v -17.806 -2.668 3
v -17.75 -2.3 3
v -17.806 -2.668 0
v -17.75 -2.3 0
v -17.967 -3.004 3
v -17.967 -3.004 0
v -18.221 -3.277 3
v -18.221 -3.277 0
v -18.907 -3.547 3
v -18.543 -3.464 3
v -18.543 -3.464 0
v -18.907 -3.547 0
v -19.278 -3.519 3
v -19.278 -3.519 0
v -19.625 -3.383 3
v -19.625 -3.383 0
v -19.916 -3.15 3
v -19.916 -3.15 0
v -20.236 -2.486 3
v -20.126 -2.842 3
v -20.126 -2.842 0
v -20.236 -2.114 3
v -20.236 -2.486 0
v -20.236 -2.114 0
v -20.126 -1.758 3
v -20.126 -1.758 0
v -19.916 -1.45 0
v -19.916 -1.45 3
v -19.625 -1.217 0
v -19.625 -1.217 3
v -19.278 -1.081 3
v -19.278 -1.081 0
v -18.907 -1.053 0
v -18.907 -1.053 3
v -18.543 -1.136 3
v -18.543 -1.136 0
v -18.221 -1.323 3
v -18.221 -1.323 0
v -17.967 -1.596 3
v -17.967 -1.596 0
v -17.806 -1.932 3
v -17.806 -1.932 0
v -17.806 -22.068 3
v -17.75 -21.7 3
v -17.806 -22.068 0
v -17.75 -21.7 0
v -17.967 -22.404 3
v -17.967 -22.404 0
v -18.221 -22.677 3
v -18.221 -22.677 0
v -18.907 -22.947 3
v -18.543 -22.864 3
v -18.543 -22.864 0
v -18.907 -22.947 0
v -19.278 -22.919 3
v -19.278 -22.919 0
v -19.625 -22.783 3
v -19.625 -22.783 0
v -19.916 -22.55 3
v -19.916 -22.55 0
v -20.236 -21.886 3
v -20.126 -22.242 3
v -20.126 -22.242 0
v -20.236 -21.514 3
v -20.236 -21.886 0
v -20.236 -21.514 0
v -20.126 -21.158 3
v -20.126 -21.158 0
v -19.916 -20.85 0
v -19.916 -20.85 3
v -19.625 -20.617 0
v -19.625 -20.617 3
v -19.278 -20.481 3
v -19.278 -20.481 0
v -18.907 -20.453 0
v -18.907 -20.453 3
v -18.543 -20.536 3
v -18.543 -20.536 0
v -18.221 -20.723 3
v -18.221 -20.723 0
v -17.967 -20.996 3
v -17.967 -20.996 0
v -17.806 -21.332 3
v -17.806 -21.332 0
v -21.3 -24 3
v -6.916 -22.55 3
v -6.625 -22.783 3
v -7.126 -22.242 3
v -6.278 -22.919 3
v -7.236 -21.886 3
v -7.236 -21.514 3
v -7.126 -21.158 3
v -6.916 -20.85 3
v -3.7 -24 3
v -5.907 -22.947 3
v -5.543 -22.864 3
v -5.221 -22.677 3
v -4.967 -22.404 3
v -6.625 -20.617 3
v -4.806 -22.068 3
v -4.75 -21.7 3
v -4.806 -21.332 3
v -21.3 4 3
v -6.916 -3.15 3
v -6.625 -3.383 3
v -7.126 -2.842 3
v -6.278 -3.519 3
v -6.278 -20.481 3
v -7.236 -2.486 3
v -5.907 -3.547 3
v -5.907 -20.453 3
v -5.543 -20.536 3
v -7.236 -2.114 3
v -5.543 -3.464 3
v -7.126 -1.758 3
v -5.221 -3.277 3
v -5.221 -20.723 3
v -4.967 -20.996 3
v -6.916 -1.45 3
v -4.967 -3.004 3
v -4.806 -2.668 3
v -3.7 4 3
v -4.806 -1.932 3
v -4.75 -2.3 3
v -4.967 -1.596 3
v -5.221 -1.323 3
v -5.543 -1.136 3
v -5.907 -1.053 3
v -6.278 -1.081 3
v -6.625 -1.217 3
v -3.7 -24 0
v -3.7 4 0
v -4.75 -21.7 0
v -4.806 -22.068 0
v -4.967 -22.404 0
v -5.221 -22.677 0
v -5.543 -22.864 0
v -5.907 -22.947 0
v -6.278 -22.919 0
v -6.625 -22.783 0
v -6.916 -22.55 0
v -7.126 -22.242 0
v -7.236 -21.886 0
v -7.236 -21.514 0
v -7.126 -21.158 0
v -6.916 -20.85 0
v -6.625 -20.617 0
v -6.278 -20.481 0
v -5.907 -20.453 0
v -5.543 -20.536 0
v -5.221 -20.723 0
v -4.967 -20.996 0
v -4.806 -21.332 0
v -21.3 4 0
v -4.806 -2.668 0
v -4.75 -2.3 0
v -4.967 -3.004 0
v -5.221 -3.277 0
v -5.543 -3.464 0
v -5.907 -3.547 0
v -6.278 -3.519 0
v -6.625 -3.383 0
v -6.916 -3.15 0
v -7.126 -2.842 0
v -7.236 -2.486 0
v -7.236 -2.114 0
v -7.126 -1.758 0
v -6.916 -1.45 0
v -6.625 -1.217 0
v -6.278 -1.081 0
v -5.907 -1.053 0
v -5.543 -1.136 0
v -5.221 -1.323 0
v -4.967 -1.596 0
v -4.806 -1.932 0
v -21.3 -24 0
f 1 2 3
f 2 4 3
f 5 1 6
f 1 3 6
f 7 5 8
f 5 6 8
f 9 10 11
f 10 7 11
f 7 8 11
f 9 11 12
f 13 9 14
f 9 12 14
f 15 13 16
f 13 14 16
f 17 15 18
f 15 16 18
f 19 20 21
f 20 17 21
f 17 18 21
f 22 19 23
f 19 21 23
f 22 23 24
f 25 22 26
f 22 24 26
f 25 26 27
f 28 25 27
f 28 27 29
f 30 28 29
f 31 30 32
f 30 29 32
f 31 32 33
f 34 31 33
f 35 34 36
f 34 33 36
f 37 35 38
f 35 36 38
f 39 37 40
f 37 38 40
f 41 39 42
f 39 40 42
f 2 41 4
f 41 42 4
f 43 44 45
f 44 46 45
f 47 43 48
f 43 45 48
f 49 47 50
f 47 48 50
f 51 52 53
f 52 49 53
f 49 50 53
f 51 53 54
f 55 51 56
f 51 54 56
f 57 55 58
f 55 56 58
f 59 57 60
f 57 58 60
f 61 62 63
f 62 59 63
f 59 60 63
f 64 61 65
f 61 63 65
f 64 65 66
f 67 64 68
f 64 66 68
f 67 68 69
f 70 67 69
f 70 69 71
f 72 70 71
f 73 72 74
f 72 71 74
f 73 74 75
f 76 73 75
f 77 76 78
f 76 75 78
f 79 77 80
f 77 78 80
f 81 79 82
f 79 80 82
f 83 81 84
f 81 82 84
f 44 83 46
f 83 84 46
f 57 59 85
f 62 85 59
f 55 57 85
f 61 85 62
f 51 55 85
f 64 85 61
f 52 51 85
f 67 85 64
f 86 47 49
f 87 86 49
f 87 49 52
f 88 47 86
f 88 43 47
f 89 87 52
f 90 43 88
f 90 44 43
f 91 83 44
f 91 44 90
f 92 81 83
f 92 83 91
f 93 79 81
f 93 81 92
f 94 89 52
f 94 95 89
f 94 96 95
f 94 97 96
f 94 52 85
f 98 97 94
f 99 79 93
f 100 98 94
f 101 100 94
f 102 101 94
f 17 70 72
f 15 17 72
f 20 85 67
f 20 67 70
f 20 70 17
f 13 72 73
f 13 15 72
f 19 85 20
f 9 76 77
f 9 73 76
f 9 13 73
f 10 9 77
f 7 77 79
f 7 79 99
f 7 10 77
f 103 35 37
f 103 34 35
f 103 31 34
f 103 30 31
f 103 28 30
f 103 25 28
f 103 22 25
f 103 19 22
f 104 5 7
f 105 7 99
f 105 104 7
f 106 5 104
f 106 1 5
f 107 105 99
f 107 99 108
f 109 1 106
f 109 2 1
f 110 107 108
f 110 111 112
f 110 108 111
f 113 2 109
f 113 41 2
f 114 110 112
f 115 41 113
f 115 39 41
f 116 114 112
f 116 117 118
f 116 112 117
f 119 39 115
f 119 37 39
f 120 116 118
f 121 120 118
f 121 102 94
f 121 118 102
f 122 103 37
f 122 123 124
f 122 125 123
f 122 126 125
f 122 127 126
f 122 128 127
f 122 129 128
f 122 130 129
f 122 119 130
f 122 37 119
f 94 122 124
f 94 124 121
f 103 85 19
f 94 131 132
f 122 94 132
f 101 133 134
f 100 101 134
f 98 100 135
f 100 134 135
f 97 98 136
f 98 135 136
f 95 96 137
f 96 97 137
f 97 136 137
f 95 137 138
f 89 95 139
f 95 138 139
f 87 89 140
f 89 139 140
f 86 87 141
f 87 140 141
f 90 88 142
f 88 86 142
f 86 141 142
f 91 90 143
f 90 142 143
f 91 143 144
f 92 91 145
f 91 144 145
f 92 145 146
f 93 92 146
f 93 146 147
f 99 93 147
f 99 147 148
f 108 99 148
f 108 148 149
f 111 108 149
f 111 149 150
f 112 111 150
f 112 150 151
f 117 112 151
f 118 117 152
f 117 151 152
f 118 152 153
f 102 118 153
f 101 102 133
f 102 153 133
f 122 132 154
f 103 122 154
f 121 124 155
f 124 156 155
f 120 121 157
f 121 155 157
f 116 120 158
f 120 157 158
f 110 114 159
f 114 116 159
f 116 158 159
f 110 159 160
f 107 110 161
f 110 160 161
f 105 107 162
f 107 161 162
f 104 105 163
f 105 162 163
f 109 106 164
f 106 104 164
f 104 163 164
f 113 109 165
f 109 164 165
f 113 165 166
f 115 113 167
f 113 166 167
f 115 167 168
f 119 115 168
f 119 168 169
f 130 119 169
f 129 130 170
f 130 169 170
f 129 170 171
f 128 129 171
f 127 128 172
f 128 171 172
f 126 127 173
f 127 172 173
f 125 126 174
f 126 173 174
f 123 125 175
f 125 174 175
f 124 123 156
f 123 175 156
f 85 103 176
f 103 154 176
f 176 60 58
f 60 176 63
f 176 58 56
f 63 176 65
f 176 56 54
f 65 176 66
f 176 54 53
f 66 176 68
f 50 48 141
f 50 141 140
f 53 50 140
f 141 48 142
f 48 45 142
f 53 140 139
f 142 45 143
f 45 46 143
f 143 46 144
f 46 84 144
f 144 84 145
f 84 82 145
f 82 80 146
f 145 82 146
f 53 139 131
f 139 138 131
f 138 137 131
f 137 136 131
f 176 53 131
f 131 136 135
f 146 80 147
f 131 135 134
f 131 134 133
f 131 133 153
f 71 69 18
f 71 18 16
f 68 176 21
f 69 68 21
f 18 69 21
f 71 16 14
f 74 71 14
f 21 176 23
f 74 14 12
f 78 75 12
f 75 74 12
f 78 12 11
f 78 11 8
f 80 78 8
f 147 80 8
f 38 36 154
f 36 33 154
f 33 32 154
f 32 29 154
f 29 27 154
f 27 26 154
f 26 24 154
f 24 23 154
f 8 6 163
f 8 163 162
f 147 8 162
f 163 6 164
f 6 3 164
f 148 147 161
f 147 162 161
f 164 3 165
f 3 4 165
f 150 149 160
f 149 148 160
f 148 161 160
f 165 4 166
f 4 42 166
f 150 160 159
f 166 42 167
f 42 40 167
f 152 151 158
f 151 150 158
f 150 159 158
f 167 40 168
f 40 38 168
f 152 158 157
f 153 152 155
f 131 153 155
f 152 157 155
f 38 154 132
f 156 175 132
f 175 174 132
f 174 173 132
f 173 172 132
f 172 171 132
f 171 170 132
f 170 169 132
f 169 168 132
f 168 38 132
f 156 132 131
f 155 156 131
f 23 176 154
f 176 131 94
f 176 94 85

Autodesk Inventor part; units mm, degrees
ref_plane "YZ Plane" through (0, 0, 0) normal (1, 0, 0) x (0, 1, 0)
ref_plane "XZ Plane" through (0, 0, 0) normal (0, 1, 0) x (-1, 0, 0)
ref_plane "XY Plane" through (0, 0, 0) normal (0, 0, 1) x (1, 0, 0)
ref_plane "作業平面1" through (0, 0, 0) normal (0, 0, 1) x (1, 0, 0)
sketch "スケッチ1" plane through (0, 0, 0) normal (0, 0, 1) x (1, 0, 0)
  circle A0 centre (-6, -21.7) radius 1.25 projected
  circle A1 centre (-19, -21.7) radius 1.25 projected
  circle A2 centre (-19, -2.3) radius 1.25 projected
  circle A3 centre (-6, -2.3) radius 1.25 projected
  line L0 (0, -24) -> (-27.3, -24) projected
  line L1 (-3.7, -24) -> (-3.7, 4)
  line L2 (-3.7, 4) -> (-21.3, 4)
  line L3 (-21.3, 4) -> (-21.3, -24)
  circle A4 centre (-6, -21.7) radius 2.3 construction
  circle A5 centre (-19, -21.7) radius 2.3 construction
  point P0 (0, 0)
  dimension "d0" = 28
extrude "押し出し1" add sketch "スケッチ1" along normal blind 3
properties part number "KickerMount_R"
